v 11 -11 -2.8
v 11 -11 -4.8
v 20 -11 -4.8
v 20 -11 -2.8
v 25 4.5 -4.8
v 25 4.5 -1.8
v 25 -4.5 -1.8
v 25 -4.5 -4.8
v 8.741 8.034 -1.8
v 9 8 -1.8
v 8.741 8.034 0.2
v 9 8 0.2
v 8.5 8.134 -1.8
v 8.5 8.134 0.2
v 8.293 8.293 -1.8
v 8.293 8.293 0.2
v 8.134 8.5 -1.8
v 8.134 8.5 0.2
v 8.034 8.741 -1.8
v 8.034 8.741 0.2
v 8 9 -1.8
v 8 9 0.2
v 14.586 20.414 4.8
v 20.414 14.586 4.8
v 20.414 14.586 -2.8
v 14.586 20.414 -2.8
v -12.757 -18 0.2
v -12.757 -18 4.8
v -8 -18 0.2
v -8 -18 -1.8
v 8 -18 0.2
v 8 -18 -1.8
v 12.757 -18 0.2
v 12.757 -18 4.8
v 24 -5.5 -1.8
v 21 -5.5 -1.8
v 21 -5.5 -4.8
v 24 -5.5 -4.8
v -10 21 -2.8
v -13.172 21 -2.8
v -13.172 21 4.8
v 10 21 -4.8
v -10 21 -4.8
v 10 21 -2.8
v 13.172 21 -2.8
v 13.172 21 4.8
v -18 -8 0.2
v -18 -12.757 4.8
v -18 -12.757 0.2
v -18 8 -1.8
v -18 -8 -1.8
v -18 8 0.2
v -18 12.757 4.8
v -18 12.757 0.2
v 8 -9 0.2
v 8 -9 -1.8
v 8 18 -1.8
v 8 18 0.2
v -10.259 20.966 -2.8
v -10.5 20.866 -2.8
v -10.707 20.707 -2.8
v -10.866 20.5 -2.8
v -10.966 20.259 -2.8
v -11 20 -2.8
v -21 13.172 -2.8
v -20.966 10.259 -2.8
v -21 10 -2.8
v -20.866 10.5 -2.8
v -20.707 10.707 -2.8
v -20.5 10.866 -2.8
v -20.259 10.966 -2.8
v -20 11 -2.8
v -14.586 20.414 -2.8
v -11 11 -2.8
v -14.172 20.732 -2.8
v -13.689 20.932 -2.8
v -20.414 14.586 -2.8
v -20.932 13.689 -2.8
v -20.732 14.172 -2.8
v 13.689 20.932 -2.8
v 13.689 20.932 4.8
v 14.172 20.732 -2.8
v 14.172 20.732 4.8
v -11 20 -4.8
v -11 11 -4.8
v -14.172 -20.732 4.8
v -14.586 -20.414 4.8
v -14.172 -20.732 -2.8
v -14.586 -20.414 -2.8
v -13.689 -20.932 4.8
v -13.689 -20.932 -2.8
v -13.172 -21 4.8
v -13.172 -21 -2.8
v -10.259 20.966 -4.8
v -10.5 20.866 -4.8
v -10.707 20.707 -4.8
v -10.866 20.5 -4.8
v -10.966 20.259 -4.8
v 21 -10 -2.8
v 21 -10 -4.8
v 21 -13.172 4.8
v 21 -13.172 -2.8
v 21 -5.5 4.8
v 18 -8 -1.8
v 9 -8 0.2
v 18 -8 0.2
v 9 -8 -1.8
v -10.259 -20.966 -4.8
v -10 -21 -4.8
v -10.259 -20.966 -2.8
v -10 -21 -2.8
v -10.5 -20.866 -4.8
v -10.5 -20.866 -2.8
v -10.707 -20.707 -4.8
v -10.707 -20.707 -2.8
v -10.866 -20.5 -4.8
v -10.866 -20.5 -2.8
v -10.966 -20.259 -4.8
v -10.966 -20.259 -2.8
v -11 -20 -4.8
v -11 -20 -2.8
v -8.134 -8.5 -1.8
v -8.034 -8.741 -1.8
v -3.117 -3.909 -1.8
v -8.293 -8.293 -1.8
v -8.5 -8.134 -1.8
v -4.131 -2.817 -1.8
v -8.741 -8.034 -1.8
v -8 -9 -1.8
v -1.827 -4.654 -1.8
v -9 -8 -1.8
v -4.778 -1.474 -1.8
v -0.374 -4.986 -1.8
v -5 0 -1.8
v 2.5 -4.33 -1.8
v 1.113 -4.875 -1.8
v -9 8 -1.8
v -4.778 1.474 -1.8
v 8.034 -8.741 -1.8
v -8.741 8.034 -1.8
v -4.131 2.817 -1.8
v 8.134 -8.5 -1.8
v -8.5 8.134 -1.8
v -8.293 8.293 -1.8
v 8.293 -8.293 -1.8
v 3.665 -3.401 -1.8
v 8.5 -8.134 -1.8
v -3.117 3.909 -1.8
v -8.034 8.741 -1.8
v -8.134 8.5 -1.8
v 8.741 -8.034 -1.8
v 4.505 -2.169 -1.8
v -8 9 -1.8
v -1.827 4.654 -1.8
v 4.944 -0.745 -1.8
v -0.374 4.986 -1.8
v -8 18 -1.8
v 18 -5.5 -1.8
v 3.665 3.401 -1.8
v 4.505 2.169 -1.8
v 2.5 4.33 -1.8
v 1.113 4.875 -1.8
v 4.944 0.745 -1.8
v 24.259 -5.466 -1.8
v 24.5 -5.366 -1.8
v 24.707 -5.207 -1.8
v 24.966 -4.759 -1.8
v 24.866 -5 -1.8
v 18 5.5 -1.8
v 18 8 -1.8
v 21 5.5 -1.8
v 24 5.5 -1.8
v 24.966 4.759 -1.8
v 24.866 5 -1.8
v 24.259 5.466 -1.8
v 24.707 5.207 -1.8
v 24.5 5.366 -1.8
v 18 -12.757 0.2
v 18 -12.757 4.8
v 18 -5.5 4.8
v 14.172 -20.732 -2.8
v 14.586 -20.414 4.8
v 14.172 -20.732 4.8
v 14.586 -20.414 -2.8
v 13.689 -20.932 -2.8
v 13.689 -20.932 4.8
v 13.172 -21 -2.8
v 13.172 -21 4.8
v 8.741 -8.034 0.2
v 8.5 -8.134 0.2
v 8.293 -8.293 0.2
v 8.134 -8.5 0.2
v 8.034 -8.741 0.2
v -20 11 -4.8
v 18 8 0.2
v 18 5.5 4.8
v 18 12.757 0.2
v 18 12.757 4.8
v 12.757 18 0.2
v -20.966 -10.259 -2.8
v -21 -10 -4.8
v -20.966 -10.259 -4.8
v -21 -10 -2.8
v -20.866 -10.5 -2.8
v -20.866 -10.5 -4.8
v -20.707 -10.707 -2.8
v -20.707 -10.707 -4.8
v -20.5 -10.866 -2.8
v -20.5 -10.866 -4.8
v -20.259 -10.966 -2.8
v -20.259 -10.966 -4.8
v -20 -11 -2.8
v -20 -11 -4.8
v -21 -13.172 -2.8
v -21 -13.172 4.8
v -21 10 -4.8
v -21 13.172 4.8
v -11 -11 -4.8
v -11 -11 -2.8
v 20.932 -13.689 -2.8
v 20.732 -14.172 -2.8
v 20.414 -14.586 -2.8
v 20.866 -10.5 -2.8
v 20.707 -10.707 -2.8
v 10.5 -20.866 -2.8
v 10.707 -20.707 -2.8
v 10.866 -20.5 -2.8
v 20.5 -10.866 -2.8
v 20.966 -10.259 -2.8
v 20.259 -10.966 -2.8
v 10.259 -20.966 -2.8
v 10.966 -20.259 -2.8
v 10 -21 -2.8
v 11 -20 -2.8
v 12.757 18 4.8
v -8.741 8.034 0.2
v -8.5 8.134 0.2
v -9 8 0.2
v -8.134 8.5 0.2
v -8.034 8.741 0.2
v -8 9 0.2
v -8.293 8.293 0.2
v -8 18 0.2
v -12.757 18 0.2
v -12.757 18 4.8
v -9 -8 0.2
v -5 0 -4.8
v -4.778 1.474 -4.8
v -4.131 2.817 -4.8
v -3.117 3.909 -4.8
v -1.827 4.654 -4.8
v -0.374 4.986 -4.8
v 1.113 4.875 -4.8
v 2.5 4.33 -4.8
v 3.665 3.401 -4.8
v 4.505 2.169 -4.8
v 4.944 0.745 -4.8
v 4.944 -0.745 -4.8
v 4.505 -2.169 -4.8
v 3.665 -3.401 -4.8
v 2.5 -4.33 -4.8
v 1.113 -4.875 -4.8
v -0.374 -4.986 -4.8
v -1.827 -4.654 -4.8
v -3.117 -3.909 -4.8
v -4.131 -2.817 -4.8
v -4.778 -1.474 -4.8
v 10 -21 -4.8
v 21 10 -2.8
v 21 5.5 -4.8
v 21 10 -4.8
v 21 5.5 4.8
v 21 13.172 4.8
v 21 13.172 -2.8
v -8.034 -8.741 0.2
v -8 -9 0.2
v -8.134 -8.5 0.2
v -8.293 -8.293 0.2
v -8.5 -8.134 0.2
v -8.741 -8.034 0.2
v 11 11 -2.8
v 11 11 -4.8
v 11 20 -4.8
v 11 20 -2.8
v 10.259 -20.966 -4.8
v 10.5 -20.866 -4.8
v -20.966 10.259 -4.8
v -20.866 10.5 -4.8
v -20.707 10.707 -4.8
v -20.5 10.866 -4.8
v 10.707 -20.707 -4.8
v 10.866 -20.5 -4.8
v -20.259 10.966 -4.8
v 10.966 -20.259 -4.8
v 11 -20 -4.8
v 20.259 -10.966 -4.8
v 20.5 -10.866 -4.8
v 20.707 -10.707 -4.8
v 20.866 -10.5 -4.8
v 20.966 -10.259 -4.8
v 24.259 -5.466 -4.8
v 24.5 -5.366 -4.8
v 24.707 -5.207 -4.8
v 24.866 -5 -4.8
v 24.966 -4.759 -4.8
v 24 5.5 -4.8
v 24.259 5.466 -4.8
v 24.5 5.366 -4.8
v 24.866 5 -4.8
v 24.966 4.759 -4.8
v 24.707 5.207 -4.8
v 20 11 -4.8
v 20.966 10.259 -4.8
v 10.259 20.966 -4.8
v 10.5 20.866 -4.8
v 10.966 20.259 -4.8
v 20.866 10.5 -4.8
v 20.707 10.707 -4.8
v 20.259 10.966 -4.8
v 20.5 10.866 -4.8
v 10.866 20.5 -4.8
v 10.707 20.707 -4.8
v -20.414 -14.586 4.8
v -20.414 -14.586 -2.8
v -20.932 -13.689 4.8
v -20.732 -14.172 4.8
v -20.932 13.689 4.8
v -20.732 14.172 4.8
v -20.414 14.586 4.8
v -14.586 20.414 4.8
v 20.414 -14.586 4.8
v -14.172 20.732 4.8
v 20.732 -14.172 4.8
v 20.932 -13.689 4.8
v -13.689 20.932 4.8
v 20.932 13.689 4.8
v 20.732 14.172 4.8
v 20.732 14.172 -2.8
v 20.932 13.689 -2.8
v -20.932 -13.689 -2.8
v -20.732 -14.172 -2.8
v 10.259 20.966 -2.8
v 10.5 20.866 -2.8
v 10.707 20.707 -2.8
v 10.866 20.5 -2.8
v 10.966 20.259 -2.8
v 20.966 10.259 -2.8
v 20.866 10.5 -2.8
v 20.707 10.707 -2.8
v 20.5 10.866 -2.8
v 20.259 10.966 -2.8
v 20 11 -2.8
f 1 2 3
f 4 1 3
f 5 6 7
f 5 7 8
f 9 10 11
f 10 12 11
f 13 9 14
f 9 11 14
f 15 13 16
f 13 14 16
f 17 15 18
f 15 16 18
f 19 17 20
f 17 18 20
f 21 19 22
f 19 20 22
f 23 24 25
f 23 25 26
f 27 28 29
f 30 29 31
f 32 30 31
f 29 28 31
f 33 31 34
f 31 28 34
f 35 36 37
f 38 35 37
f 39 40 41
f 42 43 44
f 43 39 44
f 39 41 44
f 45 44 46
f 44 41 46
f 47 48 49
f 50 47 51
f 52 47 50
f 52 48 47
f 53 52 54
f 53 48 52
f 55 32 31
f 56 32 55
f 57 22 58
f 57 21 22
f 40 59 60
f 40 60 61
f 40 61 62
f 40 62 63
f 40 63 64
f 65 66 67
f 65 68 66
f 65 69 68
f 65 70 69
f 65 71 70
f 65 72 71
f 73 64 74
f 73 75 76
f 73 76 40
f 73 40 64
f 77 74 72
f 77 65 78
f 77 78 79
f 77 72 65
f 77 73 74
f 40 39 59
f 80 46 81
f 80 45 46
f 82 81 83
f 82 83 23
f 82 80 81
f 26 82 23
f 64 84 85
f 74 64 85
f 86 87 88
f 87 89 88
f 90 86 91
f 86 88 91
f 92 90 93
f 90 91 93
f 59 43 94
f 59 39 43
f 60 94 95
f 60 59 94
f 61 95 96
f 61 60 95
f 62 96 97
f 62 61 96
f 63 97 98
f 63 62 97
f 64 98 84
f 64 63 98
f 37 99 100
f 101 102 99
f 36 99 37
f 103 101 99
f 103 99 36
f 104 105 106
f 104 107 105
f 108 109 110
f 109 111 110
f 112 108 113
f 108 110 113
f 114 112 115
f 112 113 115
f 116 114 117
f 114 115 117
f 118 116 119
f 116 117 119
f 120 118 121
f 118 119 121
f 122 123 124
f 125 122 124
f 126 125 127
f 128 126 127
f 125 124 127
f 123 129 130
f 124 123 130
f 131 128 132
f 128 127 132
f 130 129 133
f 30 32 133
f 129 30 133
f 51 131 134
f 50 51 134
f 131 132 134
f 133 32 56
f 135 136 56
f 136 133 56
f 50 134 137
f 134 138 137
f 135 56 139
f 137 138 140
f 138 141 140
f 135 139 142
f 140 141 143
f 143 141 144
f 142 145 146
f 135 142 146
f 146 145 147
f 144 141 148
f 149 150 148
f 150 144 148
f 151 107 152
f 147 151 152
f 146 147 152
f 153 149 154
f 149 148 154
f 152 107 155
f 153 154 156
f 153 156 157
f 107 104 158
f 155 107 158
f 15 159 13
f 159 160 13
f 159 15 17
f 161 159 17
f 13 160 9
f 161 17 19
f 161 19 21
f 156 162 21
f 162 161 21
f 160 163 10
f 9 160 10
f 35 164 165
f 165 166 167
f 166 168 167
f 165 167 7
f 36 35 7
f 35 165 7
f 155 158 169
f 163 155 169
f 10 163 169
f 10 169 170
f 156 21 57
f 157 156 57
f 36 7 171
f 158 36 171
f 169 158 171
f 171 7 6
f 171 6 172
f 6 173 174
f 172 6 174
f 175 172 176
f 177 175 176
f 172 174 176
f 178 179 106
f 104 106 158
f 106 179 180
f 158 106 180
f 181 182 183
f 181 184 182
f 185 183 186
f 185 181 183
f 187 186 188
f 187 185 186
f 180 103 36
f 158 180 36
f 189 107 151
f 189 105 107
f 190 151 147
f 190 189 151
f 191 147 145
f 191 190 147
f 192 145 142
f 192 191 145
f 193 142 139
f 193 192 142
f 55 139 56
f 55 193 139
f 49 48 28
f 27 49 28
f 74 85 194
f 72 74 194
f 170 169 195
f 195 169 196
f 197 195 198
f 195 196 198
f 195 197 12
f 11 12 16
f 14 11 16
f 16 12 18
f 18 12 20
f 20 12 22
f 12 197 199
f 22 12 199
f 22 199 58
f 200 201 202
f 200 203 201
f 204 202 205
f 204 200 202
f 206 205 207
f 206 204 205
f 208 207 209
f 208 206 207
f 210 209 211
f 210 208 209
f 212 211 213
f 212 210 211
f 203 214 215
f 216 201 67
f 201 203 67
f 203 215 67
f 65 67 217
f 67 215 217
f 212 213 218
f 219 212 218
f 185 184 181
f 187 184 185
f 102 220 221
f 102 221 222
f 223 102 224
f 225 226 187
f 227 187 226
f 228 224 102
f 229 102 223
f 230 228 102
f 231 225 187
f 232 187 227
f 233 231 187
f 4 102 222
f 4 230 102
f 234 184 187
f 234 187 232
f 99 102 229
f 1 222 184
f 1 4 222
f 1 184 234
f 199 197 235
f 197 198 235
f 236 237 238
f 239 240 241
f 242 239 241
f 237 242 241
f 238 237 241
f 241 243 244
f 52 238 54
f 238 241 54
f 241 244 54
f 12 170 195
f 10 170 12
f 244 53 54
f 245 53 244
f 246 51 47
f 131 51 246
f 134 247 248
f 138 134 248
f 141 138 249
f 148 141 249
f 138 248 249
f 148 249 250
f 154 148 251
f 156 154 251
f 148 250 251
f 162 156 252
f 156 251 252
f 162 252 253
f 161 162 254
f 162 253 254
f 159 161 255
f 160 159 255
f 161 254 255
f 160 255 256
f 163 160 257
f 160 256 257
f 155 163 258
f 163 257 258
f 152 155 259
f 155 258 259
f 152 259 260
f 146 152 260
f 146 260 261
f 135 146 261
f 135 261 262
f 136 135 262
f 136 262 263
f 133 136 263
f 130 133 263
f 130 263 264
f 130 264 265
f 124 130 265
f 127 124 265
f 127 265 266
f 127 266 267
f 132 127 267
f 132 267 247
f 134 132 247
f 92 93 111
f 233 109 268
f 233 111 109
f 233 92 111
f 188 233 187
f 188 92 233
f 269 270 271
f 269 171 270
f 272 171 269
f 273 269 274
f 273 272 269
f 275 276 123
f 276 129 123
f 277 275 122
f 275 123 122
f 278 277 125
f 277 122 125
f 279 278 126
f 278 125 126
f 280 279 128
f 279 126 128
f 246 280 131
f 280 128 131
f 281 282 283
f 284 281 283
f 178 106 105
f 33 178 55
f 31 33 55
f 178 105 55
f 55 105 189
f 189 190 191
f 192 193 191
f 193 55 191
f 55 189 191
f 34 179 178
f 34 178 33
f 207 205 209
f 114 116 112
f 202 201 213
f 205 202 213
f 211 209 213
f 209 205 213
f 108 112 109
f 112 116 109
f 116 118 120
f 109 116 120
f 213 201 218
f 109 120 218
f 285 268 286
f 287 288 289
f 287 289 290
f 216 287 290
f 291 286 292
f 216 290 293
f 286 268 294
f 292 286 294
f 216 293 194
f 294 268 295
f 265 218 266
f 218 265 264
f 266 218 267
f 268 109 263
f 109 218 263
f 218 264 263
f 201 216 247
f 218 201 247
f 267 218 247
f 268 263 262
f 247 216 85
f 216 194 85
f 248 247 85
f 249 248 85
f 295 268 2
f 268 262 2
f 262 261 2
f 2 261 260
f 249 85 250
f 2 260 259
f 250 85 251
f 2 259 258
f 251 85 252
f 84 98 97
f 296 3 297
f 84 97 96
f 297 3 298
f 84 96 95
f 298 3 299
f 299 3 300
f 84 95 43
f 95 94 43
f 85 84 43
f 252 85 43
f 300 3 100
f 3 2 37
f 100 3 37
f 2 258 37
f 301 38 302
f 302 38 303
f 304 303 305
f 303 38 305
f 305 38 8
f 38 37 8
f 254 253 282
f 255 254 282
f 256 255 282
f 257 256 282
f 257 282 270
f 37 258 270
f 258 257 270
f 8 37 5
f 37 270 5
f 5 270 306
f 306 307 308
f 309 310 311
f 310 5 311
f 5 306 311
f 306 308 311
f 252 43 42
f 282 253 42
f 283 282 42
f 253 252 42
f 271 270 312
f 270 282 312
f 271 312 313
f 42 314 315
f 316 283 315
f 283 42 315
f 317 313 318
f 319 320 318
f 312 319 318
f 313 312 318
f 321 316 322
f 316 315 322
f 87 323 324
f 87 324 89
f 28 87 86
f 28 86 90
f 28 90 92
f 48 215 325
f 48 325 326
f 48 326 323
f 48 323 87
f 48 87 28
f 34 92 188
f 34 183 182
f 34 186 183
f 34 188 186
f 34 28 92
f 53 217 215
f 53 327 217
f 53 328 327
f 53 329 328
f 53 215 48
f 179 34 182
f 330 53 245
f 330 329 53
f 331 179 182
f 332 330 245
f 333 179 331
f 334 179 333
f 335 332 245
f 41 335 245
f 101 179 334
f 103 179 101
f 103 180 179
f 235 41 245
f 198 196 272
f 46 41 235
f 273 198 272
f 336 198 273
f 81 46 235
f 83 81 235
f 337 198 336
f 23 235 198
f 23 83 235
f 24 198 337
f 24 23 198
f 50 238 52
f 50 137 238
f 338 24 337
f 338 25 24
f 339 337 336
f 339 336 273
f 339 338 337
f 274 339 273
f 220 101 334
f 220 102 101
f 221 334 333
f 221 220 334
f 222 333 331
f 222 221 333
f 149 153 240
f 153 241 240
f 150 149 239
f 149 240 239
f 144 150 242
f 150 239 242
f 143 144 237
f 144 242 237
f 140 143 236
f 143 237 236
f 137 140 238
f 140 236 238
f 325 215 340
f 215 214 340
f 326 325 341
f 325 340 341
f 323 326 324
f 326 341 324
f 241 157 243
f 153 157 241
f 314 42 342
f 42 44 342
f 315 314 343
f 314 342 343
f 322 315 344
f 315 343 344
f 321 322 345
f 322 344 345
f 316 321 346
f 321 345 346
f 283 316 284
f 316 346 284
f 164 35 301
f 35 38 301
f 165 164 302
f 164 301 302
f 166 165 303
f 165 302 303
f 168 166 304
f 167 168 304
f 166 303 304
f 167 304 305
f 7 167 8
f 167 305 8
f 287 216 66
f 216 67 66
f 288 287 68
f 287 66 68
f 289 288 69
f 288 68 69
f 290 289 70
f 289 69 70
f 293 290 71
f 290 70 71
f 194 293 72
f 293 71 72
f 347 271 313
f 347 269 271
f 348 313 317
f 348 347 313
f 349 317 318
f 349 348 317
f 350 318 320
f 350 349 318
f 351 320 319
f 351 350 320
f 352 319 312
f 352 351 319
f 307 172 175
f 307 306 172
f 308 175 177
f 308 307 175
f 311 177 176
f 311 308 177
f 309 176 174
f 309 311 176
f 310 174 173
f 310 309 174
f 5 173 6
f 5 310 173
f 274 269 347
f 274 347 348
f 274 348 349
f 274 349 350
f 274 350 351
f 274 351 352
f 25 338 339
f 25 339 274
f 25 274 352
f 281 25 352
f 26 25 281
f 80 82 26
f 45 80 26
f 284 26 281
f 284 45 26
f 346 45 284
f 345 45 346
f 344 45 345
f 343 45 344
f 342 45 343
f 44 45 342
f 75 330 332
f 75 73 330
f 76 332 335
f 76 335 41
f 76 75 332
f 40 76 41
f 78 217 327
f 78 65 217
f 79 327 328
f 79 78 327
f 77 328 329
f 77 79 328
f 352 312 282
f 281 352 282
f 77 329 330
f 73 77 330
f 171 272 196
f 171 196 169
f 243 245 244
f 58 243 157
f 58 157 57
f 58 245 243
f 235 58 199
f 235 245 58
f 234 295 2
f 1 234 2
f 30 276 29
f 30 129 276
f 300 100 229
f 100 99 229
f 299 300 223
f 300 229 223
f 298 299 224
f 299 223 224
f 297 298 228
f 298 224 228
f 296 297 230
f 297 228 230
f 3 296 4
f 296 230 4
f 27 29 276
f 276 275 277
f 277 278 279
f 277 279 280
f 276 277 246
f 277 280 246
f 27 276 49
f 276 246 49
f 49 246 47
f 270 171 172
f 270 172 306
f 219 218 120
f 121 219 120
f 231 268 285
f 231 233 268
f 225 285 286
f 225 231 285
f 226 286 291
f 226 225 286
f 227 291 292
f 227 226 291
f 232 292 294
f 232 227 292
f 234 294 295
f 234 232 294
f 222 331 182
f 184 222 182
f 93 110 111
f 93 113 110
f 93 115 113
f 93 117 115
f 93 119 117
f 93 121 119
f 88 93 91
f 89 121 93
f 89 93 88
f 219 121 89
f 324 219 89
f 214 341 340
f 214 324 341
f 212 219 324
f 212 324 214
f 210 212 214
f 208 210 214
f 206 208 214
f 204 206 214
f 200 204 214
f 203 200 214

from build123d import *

# Parameters (mm, degrees)
SKETCH1_W           = 42
SKETCH1_H           = 42
BOSS_EXTRUDE1_DEPTH = 4.8
CUT_EXTRUDE1_REACH  = 33.212
CUT_EXTRUDE2_DEPTH  = 2
SKETCH4_W           = 3
SKETCH4_H           = 11
BOSS_EXTRUDE2_DEPTH = 4
SHELL1_T            = -3
CUT_EXTRUDE3_REACH  = 49.202
SKETCH5_W           = 6.6
SKETCH5_H           = 11
CUT_EXTRUDE4_REACH  = 36.032
SKETCH6_R           = 5
FILLET1_R           = 2
FILLET2_R           = 1


with BuildPart() as part:
    # Sketch1 → Boss-Extrude1 (new, symmetric)
    with BuildSketch(Plane.XY):
        Rectangle(SKETCH1_W, SKETCH1_H)
    extrude(amount=BOSS_EXTRUDE1_DEPTH, both=True)

    # Sketch2 → Cut-Extrude1 (cut, up to next)
    with BuildSketch(Plane.XY.offset(4.8), mode=Mode.PRIVATE) as cut_extrude1_sk1:
        Polygon((-21, 21), (-21, 14), (-14, 21), align=None)
    cut_extrude1_tool1 = extrude(cut_extrude1_sk1.sketch, amount=-CUT_EXTRUDE1_REACH, mode=Mode.PRIVATE) & part.part
    # Sketch2 → Cut-Extrude1 (cut, up to next)
    with BuildSketch(Plane.XY.offset(4.8), mode=Mode.PRIVATE) as cut_extrude1_sk2:
        Polygon((14, 21), (21, 21), (21, 14), align=None)
    cut_extrude1_tool2 = extrude(cut_extrude1_sk2.sketch, amount=-CUT_EXTRUDE1_REACH, mode=Mode.PRIVATE) & part.part
    # Sketch2 → Cut-Extrude1 (cut, up to next)
    with BuildSketch(Plane.XY.offset(4.8), mode=Mode.PRIVATE) as cut_extrude1_sk3:
        Polygon((21, -21), (21, -14), (14, -21), align=None)
    cut_extrude1_tool3 = extrude(cut_extrude1_sk3.sketch, amount=-CUT_EXTRUDE1_REACH, mode=Mode.PRIVATE) & part.part
    # Sketch2 → Cut-Extrude1 (cut, up to next)
    with BuildSketch(Plane.XY.offset(4.8), mode=Mode.PRIVATE) as cut_extrude1_sk4:
        Polygon((-14, -21), (-21, -21), (-21, -14), align=None)
    cut_extrude1_tool4 = extrude(cut_extrude1_sk4.sketch, amount=-CUT_EXTRUDE1_REACH, mode=Mode.PRIVATE) & part.part
    add(cut_extrude1_tool1.solids().sort_by_distance((-18.666667, 18.666667, 4.8))[0], mode=Mode.SUBTRACT)
    add(cut_extrude1_tool2.solids().sort_by_distance((18.666667, 18.666667, 4.8))[0], mode=Mode.SUBTRACT)
    add(cut_extrude1_tool3.solids().sort_by_distance((18.666667, -18.666667, 4.8))[0], mode=Mode.SUBTRACT)
    add(cut_extrude1_tool4.solids().sort_by_distance((-18.666667, -18.666667, 4.8))[0], mode=Mode.SUBTRACT)

    # Sketch3 → Cut-Extrude2 (cut)
    with BuildSketch(Plane(origin=(0, 0, -4.8), x_dir=(-1, 0, 0), z_dir=(0, 0, -1))):
        Polygon((-21, 14), (-21, 11), (-11, 11), (-11, 21), (-14, 21), align=None)
        Polygon((14, 21), (11, 21), (11, 11), (21, 11), (21, 14), align=None)
        Polygon((11, -11), (11, -21), (14, -21), (21, -14), (21, -11), align=None)
        Polygon((-11, -11), (-21, -11), (-21, -14), (-14, -21), (-11, -21), align=None)
    extrude(amount=-CUT_EXTRUDE2_DEPTH, mode=Mode.SUBTRACT)

    # Sketch4 → Boss-Extrude2 (add)
    with BuildSketch(Plane(origin=(21, 0, 0), x_dir=(0, 0, -1), z_dir=(1, 0, 0))):
        with Locations((3.3, 0)):
            Rectangle(SKETCH4_W, SKETCH4_H)
    extrude(amount=BOSS_EXTRUDE2_DEPTH)

    # Shell1
    shell1_openings = [part.faces().sort_by_distance(p)[0] for p in [
        (0, 0, 4.8),
    ]]
    offset(amount=SHELL1_T, openings=shell1_openings, kind=Kind.INTERSECTION)

    # Sketch5 → Cut-Extrude3 (cut, up to next)
    with BuildSketch(Plane(origin=(21, 0, 0), x_dir=(0, 0, -1), z_dir=(1, 0, 0)), mode=Mode.PRIVATE) as cut_extrude3_sk1:
        with Locations((-1.5, 0)):
            Rectangle(SKETCH5_W, SKETCH5_H)
    cut_extrude3_tool1 = extrude(cut_extrude3_sk1.sketch, amount=-CUT_EXTRUDE3_REACH, mode=Mode.PRIVATE) & part.part
    add(cut_extrude3_tool1.solids().sort_by_distance((21, 0, 1.5))[0], mode=Mode.SUBTRACT)

    # Sketch6 → Cut-Extrude4 (cut, up to next)
    with BuildSketch(Plane(origin=(0, 0, -4.8), x_dir=(-1, 0, 0), z_dir=(0, 0, -1)), mode=Mode.PRIVATE) as cut_extrude4_sk1:
        Circle(SKETCH6_R)
    cut_extrude4_tool1 = extrude(cut_extrude4_sk1.sketch, amount=-CUT_EXTRUDE4_REACH, mode=Mode.PRIVATE) & part.part
    add(cut_extrude4_tool1.solids().sort_by_distance((0, 0, -4.8))[0], mode=Mode.SUBTRACT)

    # Fillet1
    fillet1_edges = [part.edges().sort_by_distance(p)[0] for p in [
        (-14, -21, 1),
        (-21, -14, 1),
        (21, -14, 1),
        (14, -21, 1),
        (14, 21, 1),
        (21, 14, 1),
        (-21, 14, 1),
        (-14, 21, 1),
    ]]
    fillet(fillet1_edges, radius=FILLET1_R)

    # Fillet2
    fillet2_edges = [part.edges().sort_by_distance(p)[0] for p in [
        (25, 5.5, -3.3),
        (25, -5.5, -3.3),
        (-8, -8, -0.8),
        (8, -8, -0.8),
        (8, 8, -0.8),
        (-8, 8, -0.8),
        (21, -11, -3.8),
        (11, -21, -3.8),
        (-11, -21, -3.8),
        (-21, -11, -3.8),
        (-21, 11, -3.8),
        (-11, 21, -3.8),
        (11, 21, -3.8),
        (21, 11, -3.8),
    ]]
    fillet(fillet2_edges, radius=FILLET2_R)


solid = part.part
